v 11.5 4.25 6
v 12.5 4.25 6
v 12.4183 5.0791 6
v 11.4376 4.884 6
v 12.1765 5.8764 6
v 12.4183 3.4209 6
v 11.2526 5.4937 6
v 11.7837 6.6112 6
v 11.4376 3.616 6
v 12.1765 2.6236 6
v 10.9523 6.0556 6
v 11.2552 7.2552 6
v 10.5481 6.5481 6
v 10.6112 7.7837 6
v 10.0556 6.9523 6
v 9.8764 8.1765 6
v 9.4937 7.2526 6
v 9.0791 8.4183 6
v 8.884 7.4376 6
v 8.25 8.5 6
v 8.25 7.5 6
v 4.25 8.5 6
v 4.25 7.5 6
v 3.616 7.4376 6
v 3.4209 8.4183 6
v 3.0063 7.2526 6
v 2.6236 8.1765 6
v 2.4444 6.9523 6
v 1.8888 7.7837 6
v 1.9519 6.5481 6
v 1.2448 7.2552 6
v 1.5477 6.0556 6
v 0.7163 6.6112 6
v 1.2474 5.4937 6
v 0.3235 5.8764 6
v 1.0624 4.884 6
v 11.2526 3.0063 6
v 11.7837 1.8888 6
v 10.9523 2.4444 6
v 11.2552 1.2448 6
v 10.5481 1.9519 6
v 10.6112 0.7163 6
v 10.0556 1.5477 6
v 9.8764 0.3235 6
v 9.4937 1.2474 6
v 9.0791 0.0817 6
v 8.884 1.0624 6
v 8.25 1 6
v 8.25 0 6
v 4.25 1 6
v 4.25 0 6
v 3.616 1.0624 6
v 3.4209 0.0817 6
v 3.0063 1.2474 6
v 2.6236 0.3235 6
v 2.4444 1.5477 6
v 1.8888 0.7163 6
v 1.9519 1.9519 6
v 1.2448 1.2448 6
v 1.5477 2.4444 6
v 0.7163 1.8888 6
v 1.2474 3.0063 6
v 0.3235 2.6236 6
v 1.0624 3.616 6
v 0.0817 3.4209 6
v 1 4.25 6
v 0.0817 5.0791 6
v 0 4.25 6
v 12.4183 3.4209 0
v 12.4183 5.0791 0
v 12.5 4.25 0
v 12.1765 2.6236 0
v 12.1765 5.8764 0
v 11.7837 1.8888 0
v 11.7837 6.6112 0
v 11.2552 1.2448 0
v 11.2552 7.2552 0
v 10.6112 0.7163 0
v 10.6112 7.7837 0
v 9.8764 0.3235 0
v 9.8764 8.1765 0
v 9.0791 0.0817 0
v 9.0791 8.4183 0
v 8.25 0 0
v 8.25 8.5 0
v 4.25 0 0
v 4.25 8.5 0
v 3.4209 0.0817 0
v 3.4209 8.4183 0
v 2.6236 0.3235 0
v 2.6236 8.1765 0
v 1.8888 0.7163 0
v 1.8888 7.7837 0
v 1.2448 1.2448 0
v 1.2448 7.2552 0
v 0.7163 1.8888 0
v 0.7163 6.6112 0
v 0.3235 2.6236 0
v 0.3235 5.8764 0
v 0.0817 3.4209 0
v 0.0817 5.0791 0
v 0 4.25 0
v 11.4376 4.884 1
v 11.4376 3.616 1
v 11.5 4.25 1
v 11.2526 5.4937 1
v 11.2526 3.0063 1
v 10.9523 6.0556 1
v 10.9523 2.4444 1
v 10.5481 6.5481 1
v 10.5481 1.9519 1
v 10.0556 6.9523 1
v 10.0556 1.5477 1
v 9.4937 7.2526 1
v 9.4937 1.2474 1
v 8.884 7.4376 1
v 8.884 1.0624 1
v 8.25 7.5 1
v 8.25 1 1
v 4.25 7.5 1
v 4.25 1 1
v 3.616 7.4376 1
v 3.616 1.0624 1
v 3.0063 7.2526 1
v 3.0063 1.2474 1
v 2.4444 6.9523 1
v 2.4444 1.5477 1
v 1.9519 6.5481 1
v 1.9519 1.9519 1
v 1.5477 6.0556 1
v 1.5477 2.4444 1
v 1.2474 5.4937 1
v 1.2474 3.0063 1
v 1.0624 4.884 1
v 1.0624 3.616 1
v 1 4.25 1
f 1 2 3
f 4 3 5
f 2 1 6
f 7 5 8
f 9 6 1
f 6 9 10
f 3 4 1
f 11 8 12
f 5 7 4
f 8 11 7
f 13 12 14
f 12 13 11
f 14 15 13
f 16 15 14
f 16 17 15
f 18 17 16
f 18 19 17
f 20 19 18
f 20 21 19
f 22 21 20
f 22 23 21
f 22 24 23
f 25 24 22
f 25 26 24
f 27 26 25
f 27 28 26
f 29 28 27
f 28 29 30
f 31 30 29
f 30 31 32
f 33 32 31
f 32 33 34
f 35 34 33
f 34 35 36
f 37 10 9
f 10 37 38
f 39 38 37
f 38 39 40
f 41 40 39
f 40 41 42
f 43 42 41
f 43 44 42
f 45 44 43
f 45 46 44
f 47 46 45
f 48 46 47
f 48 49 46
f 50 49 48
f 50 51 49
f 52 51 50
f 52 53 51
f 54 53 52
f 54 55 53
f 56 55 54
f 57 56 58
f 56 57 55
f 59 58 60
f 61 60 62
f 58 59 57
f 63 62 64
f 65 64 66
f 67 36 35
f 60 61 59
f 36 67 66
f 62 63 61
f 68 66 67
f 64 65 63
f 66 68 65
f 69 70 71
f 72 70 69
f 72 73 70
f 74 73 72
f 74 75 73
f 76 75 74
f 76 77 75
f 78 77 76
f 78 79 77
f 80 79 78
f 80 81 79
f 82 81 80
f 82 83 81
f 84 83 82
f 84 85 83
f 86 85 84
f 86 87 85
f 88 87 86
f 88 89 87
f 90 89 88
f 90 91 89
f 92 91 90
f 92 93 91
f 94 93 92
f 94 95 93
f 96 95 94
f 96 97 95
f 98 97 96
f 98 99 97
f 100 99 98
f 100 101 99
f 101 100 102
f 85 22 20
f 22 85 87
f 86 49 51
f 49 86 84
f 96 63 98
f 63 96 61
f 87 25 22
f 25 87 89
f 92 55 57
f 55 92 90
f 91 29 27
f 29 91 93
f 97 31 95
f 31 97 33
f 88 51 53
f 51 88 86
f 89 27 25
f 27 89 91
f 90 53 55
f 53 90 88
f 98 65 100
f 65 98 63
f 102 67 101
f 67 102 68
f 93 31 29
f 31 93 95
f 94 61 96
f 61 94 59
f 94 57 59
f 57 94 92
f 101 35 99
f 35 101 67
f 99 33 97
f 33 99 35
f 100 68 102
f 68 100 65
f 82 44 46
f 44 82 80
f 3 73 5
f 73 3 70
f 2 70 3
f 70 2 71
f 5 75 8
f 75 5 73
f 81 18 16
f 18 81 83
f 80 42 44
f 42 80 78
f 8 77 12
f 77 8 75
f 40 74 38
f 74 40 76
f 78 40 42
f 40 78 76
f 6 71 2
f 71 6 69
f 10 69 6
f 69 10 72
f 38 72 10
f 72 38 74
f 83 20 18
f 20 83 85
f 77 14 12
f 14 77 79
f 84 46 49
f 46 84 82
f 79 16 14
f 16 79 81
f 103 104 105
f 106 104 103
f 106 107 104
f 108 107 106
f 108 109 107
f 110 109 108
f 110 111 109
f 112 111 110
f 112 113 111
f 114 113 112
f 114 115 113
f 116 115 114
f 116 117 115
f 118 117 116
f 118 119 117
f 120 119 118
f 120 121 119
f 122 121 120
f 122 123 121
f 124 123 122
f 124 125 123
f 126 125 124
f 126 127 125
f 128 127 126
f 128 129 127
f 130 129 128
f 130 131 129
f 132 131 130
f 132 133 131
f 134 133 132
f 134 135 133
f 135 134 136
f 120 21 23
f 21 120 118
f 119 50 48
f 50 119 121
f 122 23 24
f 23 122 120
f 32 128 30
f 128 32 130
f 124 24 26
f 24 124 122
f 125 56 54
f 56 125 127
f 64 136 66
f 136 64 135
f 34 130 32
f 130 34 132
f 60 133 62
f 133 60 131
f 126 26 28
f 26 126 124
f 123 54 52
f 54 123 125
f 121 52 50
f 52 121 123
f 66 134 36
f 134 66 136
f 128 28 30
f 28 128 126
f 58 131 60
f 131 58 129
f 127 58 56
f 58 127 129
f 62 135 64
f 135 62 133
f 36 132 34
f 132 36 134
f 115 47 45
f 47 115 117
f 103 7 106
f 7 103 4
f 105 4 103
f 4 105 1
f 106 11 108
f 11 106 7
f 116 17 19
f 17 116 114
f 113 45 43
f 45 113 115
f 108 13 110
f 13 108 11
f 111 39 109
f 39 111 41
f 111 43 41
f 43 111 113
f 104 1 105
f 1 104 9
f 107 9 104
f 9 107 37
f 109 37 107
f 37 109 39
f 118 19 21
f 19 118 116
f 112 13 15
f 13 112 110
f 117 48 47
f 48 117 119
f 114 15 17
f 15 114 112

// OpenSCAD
// file: bezledcube.scad
$fn = 32;
module b_cube(
length = 5,
depth = 5,
height = 5,
b_radius = 1){
	union(){
		translate([ 0, b_radius, 0]){
			cube([ length, depth - 2* b_radius, height]);
		}
		translate([ b_radius, 0, 0]){
			cube([ length - 2* b_radius, depth, height]);
		}
		translate([ b_radius, b_radius, 0]){
			cylinder( height, b_radius, b_radius);
		}
		translate([ length - b_radius, b_radius, 0]){
			cylinder( height, b_radius, b_radius);
		}
		translate([ b_radius, depth - b_radius, 0]){
			cylinder( height, b_radius, b_radius);
		}
		translate([ length - b_radius, depth - b_radius, 0]){
			cylinder( height, b_radius, b_radius);
		}
	}
}
// main file
include <bezledcube.scad>
module railstop(
length = 10.5,
depth = 6.5,
height = 5,
bezle = 1){
	difference(){
		b_cube(length + 2* bezle, depth + 2* bezle, height + bezle, depth/2 + bezle);
		translate([ bezle, bezle, bezle]){
			b_cube(length,depth,height,depth/2);
		}
	}
}

railstop();
